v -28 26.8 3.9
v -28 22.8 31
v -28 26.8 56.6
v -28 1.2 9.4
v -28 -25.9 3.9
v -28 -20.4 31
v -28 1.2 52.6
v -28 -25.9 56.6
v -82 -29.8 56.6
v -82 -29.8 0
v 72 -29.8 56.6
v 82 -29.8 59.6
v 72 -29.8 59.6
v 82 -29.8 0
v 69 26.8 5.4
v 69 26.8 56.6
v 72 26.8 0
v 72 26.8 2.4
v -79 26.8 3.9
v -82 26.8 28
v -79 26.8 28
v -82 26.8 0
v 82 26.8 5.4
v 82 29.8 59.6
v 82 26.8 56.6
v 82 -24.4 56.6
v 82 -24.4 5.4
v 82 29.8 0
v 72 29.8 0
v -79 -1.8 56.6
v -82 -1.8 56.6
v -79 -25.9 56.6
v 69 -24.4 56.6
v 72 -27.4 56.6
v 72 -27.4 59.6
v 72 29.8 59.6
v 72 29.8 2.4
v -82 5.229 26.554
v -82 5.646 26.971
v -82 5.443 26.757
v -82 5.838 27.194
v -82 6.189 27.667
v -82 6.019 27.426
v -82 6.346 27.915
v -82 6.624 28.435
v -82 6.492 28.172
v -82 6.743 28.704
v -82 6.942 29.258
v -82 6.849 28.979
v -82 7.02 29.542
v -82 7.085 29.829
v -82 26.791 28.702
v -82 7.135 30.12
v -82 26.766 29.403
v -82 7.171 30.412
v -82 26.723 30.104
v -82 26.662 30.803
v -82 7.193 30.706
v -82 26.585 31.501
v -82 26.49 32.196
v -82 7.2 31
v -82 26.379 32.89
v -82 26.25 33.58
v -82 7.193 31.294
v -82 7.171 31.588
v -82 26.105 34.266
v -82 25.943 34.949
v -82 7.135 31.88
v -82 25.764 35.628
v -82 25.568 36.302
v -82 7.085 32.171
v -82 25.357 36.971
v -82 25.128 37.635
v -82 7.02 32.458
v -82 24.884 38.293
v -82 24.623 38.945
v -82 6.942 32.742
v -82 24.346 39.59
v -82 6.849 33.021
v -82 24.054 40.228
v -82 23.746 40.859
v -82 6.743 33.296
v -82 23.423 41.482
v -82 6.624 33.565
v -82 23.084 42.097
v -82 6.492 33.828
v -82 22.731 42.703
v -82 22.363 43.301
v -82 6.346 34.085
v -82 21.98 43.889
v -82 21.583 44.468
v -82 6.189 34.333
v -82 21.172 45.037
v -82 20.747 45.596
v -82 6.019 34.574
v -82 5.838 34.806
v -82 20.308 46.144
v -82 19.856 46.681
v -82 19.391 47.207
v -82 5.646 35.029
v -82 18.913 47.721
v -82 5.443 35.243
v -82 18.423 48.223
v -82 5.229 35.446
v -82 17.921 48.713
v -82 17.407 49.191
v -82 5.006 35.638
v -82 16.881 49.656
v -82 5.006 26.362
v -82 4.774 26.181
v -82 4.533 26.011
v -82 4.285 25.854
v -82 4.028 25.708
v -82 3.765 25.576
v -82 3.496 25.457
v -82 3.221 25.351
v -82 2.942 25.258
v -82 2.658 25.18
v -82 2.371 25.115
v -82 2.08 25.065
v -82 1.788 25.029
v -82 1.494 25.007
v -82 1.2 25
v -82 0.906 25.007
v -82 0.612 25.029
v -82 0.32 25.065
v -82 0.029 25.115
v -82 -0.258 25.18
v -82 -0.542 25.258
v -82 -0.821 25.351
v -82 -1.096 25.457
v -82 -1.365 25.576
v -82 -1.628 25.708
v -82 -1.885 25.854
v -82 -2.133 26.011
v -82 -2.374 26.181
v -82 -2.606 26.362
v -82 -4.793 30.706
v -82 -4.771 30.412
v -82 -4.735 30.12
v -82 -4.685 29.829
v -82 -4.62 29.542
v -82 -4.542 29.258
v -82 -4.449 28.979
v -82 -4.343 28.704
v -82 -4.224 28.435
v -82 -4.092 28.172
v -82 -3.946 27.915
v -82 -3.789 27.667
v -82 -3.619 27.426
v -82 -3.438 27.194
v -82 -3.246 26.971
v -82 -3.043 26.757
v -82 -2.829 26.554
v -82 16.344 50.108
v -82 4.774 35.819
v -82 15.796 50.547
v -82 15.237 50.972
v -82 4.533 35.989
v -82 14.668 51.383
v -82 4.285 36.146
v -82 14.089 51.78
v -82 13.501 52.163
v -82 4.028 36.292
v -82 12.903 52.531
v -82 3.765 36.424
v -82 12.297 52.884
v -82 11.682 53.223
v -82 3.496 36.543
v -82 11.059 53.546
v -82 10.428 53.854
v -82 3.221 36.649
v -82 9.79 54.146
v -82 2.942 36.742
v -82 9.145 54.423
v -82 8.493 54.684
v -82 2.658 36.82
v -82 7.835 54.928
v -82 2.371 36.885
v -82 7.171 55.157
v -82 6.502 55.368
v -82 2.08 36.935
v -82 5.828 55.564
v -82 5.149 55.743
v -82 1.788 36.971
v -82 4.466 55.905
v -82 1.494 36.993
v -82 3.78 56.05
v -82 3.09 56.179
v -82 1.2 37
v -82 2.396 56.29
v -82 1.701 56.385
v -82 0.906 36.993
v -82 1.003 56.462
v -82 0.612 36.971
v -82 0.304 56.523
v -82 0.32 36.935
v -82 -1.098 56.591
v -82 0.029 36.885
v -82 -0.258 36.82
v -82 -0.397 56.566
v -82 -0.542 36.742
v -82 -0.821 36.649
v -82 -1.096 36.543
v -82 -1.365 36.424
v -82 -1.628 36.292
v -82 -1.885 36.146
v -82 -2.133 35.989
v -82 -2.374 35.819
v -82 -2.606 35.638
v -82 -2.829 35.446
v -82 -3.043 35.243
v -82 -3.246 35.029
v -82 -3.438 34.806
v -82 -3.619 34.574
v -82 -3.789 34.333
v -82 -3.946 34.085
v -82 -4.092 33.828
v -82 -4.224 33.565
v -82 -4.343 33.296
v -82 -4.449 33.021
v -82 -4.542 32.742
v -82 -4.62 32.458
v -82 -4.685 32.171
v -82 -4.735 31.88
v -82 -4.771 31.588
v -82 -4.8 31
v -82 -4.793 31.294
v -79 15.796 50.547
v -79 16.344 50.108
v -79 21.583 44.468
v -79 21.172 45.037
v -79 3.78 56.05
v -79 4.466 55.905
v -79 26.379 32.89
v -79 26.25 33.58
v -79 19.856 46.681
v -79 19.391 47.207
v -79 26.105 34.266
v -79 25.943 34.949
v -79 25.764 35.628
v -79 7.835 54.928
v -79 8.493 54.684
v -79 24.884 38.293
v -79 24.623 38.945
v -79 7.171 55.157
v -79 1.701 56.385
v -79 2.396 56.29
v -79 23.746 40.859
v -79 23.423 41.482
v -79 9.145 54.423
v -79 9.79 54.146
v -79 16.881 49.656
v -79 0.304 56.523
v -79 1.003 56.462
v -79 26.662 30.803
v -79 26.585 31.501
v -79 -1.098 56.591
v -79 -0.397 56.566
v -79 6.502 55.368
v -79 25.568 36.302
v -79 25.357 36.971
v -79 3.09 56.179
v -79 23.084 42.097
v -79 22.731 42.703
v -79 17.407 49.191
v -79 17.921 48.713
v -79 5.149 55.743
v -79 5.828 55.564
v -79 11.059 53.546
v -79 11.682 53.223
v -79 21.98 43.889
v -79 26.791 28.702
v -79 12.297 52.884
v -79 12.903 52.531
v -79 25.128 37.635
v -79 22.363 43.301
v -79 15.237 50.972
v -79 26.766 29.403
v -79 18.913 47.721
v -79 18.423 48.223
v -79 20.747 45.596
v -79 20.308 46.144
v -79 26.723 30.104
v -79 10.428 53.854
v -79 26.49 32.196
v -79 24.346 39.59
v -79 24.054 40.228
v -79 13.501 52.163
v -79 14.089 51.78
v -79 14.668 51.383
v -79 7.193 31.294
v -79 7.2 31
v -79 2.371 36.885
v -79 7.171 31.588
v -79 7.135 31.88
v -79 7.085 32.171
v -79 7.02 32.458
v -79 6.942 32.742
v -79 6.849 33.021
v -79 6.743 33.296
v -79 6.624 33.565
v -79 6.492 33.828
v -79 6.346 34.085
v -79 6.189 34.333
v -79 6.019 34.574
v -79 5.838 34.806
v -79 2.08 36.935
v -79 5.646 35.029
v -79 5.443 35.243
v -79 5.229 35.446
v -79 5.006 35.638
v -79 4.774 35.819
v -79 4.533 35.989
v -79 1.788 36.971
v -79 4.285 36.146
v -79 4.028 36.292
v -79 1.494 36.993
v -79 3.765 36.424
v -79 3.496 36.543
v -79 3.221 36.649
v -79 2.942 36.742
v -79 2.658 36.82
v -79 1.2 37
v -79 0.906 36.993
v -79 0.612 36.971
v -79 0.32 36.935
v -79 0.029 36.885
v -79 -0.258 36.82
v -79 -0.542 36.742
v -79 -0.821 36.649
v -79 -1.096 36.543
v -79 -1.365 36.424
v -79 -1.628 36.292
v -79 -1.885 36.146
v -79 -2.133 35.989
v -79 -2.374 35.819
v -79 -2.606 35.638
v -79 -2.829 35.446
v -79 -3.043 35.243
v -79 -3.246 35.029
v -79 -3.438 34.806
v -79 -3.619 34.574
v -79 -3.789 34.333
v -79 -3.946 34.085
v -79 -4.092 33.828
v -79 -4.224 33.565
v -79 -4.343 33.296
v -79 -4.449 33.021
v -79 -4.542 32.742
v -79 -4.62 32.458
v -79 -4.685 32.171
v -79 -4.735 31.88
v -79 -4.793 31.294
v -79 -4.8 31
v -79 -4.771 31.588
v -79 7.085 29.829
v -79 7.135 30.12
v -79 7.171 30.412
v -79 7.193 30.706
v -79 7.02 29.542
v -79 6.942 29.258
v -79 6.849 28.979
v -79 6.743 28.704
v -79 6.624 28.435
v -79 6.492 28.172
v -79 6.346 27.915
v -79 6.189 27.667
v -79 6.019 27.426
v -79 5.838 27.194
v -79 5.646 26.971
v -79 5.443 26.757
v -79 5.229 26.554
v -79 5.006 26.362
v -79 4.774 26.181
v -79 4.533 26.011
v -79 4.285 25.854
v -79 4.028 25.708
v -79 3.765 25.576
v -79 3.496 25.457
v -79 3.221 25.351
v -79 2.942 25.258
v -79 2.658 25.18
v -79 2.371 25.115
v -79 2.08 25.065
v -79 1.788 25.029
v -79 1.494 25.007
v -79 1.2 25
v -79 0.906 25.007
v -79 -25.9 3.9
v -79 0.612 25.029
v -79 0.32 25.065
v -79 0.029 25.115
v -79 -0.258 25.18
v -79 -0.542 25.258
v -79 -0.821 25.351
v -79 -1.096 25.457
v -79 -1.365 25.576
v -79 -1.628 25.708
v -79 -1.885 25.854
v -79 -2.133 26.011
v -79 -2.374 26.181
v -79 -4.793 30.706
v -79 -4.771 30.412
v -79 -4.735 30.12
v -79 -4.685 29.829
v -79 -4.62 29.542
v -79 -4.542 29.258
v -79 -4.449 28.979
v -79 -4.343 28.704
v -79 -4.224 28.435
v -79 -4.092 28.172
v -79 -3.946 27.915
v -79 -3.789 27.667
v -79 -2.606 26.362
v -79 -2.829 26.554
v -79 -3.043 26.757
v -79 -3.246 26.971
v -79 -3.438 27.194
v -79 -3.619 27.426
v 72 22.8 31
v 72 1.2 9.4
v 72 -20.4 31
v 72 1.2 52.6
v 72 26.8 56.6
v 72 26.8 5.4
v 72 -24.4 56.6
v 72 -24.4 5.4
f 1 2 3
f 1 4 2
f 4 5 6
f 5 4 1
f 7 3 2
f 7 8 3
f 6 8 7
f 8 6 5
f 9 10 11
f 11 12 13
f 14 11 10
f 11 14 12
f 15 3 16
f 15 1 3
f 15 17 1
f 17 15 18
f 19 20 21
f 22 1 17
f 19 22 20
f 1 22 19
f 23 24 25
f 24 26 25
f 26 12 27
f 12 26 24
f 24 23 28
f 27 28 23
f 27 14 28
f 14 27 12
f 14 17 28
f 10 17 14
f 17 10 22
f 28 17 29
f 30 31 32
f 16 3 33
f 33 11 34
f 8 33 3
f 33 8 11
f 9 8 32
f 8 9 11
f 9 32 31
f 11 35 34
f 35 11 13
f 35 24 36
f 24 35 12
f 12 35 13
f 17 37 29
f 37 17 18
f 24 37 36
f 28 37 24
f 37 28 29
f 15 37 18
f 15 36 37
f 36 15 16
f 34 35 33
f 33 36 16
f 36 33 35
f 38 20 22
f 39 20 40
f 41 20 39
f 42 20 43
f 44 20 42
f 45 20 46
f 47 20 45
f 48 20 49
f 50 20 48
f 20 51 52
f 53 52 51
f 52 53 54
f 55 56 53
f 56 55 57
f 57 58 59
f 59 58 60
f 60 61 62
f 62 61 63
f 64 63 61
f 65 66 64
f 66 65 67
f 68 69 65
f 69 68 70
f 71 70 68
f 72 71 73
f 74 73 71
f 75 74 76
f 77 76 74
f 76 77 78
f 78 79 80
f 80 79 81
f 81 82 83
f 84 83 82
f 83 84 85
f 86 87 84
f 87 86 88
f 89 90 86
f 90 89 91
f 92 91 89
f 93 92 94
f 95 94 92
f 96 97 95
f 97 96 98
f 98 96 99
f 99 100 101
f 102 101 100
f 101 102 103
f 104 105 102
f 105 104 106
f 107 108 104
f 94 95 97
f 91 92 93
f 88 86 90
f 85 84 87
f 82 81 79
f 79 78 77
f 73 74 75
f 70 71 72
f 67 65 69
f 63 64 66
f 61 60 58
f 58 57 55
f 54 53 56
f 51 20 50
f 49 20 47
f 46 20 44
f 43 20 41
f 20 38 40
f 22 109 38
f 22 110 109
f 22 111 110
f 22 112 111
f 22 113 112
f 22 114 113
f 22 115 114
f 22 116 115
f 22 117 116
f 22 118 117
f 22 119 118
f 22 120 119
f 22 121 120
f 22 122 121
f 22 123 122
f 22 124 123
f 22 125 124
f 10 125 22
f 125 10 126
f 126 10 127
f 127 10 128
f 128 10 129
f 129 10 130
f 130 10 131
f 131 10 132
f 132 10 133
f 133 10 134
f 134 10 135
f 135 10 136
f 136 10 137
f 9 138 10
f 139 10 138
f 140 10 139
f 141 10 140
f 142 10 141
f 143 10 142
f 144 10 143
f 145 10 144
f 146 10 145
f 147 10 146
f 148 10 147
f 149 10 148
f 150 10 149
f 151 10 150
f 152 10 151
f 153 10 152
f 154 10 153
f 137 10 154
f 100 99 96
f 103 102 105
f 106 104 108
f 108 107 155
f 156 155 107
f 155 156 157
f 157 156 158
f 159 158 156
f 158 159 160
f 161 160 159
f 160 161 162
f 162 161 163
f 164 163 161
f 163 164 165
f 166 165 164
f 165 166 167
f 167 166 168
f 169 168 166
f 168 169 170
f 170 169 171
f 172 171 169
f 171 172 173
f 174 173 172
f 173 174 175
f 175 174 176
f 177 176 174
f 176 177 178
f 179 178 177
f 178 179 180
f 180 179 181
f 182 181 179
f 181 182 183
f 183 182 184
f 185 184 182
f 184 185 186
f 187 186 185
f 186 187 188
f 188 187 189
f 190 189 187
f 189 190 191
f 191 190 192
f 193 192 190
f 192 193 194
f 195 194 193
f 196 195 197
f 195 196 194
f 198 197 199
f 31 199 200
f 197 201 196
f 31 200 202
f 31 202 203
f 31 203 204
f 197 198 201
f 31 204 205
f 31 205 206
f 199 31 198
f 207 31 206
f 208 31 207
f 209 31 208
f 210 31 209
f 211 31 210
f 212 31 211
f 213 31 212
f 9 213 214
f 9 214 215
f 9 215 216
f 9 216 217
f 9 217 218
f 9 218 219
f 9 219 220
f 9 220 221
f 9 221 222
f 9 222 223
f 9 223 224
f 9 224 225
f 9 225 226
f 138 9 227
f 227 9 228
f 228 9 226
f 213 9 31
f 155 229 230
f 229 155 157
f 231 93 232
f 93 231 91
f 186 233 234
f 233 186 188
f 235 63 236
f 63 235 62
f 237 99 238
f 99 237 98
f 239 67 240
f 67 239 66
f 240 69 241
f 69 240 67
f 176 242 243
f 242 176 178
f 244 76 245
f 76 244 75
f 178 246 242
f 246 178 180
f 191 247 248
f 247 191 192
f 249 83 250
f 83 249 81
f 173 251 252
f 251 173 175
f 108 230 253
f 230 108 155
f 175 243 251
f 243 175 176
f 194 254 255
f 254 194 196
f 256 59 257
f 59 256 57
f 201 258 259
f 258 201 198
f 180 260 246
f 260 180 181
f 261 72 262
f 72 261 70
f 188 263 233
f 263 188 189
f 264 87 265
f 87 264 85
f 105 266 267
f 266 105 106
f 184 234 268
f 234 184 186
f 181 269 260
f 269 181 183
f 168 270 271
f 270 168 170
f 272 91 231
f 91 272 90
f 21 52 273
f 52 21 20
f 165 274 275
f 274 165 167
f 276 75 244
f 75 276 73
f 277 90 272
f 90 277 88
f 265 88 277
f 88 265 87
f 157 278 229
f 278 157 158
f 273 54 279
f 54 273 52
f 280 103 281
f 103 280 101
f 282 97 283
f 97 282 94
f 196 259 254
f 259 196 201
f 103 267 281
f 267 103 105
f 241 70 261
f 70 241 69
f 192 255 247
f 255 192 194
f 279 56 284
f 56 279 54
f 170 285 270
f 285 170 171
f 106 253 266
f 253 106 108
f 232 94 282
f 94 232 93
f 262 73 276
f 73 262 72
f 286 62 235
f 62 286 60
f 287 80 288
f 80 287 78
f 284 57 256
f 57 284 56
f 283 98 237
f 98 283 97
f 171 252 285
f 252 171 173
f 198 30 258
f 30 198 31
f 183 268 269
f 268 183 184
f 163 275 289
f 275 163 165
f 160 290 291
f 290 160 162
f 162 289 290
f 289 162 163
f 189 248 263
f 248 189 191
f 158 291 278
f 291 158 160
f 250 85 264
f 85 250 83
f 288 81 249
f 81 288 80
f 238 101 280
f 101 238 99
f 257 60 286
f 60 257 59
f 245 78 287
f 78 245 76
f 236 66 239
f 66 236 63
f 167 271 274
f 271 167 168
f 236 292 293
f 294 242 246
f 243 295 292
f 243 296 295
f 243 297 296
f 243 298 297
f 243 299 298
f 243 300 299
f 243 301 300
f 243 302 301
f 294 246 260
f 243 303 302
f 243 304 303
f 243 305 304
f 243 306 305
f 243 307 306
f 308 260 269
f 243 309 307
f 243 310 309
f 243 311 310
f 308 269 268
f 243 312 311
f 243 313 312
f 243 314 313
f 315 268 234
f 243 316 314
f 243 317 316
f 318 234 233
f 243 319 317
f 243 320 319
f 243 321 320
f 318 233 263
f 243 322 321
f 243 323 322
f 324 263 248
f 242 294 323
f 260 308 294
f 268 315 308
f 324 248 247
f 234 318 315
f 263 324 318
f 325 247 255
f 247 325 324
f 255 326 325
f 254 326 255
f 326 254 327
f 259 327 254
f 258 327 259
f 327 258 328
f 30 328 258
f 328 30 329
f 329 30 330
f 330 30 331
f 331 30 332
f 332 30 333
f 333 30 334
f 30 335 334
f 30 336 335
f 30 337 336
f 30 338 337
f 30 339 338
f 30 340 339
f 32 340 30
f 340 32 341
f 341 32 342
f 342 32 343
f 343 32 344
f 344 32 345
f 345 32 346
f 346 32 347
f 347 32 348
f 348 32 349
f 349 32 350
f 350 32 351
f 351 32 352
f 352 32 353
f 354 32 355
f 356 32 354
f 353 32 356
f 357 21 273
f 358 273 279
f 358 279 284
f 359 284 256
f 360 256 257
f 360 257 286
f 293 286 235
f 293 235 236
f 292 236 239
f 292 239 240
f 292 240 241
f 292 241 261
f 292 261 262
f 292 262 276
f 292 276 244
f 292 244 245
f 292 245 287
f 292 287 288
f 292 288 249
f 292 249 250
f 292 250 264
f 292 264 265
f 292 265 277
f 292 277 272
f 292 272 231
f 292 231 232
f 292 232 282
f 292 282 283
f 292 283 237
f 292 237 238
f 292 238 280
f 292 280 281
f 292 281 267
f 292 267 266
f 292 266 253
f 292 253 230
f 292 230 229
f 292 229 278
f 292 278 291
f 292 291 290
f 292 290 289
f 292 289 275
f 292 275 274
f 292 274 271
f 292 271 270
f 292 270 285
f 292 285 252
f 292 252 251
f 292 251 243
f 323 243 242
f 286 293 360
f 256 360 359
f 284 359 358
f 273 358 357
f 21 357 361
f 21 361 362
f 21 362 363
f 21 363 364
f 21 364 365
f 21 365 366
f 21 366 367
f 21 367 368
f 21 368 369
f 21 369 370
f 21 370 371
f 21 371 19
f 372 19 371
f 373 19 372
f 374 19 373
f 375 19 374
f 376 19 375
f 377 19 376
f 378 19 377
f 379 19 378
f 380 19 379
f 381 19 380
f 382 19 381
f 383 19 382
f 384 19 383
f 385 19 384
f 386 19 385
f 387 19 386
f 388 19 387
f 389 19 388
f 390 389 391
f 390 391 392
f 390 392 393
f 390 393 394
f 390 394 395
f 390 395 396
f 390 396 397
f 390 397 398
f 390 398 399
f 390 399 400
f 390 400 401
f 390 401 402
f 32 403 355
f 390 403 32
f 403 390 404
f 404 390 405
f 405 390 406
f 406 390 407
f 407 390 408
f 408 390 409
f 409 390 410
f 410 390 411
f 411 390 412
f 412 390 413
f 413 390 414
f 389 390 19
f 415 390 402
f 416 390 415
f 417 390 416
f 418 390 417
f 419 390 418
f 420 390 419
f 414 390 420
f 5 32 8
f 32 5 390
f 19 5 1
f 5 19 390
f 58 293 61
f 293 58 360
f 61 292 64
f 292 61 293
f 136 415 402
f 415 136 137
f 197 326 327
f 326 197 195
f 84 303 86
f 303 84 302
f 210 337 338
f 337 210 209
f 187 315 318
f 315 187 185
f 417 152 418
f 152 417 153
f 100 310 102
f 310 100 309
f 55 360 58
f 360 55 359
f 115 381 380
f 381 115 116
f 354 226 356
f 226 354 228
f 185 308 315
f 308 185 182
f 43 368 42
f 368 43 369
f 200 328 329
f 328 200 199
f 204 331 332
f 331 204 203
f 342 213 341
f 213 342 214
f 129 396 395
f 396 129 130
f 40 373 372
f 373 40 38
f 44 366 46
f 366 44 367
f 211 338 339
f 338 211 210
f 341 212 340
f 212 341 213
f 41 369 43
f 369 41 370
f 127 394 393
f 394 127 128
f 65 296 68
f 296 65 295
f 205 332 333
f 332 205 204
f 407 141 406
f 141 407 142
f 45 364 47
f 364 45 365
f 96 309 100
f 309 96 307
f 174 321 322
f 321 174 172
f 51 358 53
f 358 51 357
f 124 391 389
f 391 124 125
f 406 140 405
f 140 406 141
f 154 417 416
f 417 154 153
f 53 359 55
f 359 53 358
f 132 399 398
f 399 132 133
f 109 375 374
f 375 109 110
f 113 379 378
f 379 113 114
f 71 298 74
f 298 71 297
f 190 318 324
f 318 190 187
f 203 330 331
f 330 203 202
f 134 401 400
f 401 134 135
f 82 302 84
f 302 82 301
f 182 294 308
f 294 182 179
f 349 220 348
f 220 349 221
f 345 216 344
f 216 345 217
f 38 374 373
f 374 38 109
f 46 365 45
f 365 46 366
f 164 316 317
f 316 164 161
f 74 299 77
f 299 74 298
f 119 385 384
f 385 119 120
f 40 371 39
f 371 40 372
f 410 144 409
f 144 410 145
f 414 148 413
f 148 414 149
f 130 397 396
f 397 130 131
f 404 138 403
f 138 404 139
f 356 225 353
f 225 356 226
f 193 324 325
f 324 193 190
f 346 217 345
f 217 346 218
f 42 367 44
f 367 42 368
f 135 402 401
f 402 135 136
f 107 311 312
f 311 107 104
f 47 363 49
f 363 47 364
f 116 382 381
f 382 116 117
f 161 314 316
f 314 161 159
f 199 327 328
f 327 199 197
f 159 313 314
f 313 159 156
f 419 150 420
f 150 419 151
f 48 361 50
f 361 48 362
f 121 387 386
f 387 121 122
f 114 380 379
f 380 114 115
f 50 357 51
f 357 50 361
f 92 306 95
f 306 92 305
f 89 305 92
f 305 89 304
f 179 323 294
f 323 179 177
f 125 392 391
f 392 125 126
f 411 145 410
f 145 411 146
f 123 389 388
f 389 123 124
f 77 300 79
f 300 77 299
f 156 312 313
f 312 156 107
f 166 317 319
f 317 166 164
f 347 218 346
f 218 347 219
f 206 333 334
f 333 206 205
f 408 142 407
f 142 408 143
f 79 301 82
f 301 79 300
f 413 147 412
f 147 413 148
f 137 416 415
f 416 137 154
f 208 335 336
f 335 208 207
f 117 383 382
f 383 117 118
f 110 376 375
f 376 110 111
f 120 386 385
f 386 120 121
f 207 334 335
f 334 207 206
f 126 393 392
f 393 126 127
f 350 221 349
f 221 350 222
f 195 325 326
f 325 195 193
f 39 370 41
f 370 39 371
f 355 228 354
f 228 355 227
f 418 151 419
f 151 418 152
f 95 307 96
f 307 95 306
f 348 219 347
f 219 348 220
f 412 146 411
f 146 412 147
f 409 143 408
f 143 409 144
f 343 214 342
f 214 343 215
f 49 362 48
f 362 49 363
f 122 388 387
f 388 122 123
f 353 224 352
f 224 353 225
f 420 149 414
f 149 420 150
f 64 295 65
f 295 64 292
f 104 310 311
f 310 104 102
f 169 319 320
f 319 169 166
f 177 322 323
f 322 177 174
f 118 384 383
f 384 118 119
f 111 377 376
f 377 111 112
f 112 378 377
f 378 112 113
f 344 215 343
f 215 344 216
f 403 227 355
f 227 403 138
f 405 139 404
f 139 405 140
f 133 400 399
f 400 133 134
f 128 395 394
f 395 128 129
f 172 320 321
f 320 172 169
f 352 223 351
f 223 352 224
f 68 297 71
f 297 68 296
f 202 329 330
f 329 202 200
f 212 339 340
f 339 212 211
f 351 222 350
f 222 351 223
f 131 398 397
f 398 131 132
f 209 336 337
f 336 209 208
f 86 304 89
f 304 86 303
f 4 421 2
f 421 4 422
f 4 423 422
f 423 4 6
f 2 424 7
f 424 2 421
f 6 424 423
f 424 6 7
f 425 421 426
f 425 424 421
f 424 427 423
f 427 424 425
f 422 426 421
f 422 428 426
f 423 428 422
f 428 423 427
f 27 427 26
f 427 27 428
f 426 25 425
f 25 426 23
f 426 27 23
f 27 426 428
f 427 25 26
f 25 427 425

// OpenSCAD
//-----------------------------------------------------------------------------
//
// Parameter Based Table Stacker by Matt Kidd
// A parameter based model for stacking tables which have square legs that
// screw in to the table such as LACK tables by IKEA.
//
// Dimensions are in mm unless otherwise specified.
//
//-----------------------------------------------------------------------------

//
// Variables - User modifiable
//

// Diameter of the hole to allow the leg to be screwed in to the base.
hole_dia = 12;

// Distance separating the top of the table surface and the bottom surface of the next table's leg.
extension_length = 100;

// Thickness of the table surface
table_thickness = 51;

// Depth of the recess to hold the table leg
table_leg_recess = 10;

// Thickness of the table legs
table_leg_thickness = 51.2;

// Thickness of the outer walls
outer_wall_thickness = 3;

// Thickness of the material sandwiched between bottom of table surface and top of table leg
connection_wall_thickness = 3;

// The amount by which the table surface overhangs the table feet with the tables standing on top of one another
table_leg_to_surface_edge = 2.4;

// Small value used to minimise face fighting
tol = 0.01;

// If this is turned off you will have a slimmer model designed to be printed upright.
easy_print_mode = true;

//
// Variables - Defined by other variables -
//

// Measurement for the recessed area
recess_wall_dimension = table_leg_thickness+outer_wall_thickness*2;

// Measurement for the table attachment area
outer_wall_dimension = table_leg_thickness+outer_wall_thickness+table_leg_to_surface_edge;

// Calculation to ensure that bevels connecting the parts have a 45 degree angle when printed vertically.
joint_height_overhang = outer_wall_thickness + table_leg_to_surface_edge;

module recess_part(){
    union(){
        cube([table_leg_recess,recess_wall_dimension,recess_wall_dimension],center=true);
        translate([outer_wall_thickness+table_leg_recess/2,0,0]) rotate([0,-90,0]) polyhedron(points=[[-table_leg_thickness/2,-table_leg_thickness/2,0],[-table_leg_thickness/2,+table_leg_thickness/2,0],[+table_leg_thickness/2,+table_leg_thickness/2,0],[+table_leg_thickness/2,-table_leg_thickness/2,0],[-recess_wall_dimension/2,-recess_wall_dimension/2,outer_wall_thickness],[-recess_wall_dimension/2,recess_wall_dimension/2,outer_wall_thickness],[recess_wall_dimension/2,recess_wall_dimension/2,outer_wall_thickness],[recess_wall_dimension/2,-recess_wall_dimension/2,outer_wall_thickness]],faces=[[3,2,1,0],[1,5,4,0],[2,6,5,1],[3,7,6,2],[0,4,7,3],[4,5,6,7]],convexity=10);
    }
}

module overhang_part(){
    difference(){
        union(){
            translate([(table_thickness+connection_wall_thickness)/2,(outer_wall_thickness+table_leg_to_surface_edge)/2,(outer_wall_thickness+table_leg_to_surface_edge)/2]) cube([table_thickness+connection_wall_thickness,outer_wall_dimension,outer_wall_dimension],center=true);
            translate([-joint_height_overhang,0,0]) rotate([0,-90,0]) polyhedron(
            points=[[-table_leg_thickness/2,-table_leg_thickness/2,0],
            [-table_leg_thickness/2,+table_leg_thickness/2,0],
            [+table_leg_thickness/2,+table_leg_thickness/2,0],
            [+table_leg_thickness/2,-table_leg_thickness/2,0],
            [-table_leg_thickness/2,-table_leg_thickness/2,-joint_height_overhang],
            [-table_leg_thickness/2,outer_wall_dimension-table_leg_thickness/2,-joint_height_overhang],
            [outer_wall_dimension-table_leg_thickness/2,outer_wall_dimension-table_leg_thickness/2,-joint_height_overhang],
            [outer_wall_dimension-table_leg_thickness/2,-table_leg_thickness/2,-joint_height_overhang]],
            faces=[[0,1,2,3],[0,4,5,1],[1,5,6,2],[2,6,7,3],[3,7,4,0],[7,6,5,4]],convexity=10);
        }
        translate([table_thickness/2,0-tol/2,0-tol/2]) cube([table_thickness,table_leg_thickness+outer_wall_thickness+tol,table_leg_thickness+outer_wall_thickness+tol],center=true);
        translate([table_thickness+connection_wall_thickness/2,0,0]) rotate([0,90,0]) cylinder(h=connection_wall_thickness+tol,d=hole_dia,$fn=128,center=true);
         translate([table_thickness+connection_wall_thickness/2,+outer_wall_thickness,outer_wall_thickness]) rotate([180,0,0]) difference(){
            translate([0,(recess_wall_dimension/2+1)/2,(recess_wall_dimension/2+1)/2]) cube([connection_wall_thickness+tol,recess_wall_dimension/2+1,recess_wall_dimension/2+1],center=true);
            rotate([0,90,0]) cylinder(h=connection_wall_thickness+tol*2, d=recess_wall_dimension, $fn=256, center=true);
        }
    }
}

module leg_extension(){
    difference(){
        union(){
            if(easy_print_mode){
                translate([-table_leg_recess/2,(outer_wall_thickness+table_leg_to_surface_edge)/2,(outer_wall_thickness+table_leg_to_surface_edge)/2]) cube([extension_length+table_leg_recess,outer_wall_dimension,outer_wall_dimension],center=true);
                translate([-extension_length/2-table_leg_recess/2,-table_leg_thickness/2-outer_wall_thickness/2,recess_wall_dimension/2+table_leg_to_surface_edge/2]) cube([table_leg_recess,outer_wall_thickness,table_leg_to_surface_edge],center=true);
                translate([-extension_length/2-table_leg_recess/2,table_leg_to_surface_edge/2+table_leg_thickness/2+outer_wall_thickness,outer_wall_thickness/2-recess_wall_dimension/2]) cube([table_leg_recess,table_leg_to_surface_edge,outer_wall_thickness],center=true);
            }
            else{
                cube([extension_length,table_leg_thickness,table_leg_thickness],center=true);
            }
            translate([-table_leg_recess/2-extension_length/2,0,0]) recess_part();
            translate([extension_length/2,0,0]) overhang_part();
        }
        rotate([0,90,0]) cylinder(h=extension_length+tol,d=table_leg_thickness-8,$fn=4,center=true);
        translate([-table_leg_recess/2-extension_length/2-tol/2,0,0]) cube([table_leg_recess+tol,table_leg_thickness,table_leg_thickness],center=true);
    }
}

translate([(table_thickness+connection_wall_thickness-table_leg_recess)/2,table_leg_to_surface_edge/2,table_leg_thickness/2+outer_wall_thickness+table_leg_to_surface_edge]) rotate([-90,0,180]) leg_extension();
